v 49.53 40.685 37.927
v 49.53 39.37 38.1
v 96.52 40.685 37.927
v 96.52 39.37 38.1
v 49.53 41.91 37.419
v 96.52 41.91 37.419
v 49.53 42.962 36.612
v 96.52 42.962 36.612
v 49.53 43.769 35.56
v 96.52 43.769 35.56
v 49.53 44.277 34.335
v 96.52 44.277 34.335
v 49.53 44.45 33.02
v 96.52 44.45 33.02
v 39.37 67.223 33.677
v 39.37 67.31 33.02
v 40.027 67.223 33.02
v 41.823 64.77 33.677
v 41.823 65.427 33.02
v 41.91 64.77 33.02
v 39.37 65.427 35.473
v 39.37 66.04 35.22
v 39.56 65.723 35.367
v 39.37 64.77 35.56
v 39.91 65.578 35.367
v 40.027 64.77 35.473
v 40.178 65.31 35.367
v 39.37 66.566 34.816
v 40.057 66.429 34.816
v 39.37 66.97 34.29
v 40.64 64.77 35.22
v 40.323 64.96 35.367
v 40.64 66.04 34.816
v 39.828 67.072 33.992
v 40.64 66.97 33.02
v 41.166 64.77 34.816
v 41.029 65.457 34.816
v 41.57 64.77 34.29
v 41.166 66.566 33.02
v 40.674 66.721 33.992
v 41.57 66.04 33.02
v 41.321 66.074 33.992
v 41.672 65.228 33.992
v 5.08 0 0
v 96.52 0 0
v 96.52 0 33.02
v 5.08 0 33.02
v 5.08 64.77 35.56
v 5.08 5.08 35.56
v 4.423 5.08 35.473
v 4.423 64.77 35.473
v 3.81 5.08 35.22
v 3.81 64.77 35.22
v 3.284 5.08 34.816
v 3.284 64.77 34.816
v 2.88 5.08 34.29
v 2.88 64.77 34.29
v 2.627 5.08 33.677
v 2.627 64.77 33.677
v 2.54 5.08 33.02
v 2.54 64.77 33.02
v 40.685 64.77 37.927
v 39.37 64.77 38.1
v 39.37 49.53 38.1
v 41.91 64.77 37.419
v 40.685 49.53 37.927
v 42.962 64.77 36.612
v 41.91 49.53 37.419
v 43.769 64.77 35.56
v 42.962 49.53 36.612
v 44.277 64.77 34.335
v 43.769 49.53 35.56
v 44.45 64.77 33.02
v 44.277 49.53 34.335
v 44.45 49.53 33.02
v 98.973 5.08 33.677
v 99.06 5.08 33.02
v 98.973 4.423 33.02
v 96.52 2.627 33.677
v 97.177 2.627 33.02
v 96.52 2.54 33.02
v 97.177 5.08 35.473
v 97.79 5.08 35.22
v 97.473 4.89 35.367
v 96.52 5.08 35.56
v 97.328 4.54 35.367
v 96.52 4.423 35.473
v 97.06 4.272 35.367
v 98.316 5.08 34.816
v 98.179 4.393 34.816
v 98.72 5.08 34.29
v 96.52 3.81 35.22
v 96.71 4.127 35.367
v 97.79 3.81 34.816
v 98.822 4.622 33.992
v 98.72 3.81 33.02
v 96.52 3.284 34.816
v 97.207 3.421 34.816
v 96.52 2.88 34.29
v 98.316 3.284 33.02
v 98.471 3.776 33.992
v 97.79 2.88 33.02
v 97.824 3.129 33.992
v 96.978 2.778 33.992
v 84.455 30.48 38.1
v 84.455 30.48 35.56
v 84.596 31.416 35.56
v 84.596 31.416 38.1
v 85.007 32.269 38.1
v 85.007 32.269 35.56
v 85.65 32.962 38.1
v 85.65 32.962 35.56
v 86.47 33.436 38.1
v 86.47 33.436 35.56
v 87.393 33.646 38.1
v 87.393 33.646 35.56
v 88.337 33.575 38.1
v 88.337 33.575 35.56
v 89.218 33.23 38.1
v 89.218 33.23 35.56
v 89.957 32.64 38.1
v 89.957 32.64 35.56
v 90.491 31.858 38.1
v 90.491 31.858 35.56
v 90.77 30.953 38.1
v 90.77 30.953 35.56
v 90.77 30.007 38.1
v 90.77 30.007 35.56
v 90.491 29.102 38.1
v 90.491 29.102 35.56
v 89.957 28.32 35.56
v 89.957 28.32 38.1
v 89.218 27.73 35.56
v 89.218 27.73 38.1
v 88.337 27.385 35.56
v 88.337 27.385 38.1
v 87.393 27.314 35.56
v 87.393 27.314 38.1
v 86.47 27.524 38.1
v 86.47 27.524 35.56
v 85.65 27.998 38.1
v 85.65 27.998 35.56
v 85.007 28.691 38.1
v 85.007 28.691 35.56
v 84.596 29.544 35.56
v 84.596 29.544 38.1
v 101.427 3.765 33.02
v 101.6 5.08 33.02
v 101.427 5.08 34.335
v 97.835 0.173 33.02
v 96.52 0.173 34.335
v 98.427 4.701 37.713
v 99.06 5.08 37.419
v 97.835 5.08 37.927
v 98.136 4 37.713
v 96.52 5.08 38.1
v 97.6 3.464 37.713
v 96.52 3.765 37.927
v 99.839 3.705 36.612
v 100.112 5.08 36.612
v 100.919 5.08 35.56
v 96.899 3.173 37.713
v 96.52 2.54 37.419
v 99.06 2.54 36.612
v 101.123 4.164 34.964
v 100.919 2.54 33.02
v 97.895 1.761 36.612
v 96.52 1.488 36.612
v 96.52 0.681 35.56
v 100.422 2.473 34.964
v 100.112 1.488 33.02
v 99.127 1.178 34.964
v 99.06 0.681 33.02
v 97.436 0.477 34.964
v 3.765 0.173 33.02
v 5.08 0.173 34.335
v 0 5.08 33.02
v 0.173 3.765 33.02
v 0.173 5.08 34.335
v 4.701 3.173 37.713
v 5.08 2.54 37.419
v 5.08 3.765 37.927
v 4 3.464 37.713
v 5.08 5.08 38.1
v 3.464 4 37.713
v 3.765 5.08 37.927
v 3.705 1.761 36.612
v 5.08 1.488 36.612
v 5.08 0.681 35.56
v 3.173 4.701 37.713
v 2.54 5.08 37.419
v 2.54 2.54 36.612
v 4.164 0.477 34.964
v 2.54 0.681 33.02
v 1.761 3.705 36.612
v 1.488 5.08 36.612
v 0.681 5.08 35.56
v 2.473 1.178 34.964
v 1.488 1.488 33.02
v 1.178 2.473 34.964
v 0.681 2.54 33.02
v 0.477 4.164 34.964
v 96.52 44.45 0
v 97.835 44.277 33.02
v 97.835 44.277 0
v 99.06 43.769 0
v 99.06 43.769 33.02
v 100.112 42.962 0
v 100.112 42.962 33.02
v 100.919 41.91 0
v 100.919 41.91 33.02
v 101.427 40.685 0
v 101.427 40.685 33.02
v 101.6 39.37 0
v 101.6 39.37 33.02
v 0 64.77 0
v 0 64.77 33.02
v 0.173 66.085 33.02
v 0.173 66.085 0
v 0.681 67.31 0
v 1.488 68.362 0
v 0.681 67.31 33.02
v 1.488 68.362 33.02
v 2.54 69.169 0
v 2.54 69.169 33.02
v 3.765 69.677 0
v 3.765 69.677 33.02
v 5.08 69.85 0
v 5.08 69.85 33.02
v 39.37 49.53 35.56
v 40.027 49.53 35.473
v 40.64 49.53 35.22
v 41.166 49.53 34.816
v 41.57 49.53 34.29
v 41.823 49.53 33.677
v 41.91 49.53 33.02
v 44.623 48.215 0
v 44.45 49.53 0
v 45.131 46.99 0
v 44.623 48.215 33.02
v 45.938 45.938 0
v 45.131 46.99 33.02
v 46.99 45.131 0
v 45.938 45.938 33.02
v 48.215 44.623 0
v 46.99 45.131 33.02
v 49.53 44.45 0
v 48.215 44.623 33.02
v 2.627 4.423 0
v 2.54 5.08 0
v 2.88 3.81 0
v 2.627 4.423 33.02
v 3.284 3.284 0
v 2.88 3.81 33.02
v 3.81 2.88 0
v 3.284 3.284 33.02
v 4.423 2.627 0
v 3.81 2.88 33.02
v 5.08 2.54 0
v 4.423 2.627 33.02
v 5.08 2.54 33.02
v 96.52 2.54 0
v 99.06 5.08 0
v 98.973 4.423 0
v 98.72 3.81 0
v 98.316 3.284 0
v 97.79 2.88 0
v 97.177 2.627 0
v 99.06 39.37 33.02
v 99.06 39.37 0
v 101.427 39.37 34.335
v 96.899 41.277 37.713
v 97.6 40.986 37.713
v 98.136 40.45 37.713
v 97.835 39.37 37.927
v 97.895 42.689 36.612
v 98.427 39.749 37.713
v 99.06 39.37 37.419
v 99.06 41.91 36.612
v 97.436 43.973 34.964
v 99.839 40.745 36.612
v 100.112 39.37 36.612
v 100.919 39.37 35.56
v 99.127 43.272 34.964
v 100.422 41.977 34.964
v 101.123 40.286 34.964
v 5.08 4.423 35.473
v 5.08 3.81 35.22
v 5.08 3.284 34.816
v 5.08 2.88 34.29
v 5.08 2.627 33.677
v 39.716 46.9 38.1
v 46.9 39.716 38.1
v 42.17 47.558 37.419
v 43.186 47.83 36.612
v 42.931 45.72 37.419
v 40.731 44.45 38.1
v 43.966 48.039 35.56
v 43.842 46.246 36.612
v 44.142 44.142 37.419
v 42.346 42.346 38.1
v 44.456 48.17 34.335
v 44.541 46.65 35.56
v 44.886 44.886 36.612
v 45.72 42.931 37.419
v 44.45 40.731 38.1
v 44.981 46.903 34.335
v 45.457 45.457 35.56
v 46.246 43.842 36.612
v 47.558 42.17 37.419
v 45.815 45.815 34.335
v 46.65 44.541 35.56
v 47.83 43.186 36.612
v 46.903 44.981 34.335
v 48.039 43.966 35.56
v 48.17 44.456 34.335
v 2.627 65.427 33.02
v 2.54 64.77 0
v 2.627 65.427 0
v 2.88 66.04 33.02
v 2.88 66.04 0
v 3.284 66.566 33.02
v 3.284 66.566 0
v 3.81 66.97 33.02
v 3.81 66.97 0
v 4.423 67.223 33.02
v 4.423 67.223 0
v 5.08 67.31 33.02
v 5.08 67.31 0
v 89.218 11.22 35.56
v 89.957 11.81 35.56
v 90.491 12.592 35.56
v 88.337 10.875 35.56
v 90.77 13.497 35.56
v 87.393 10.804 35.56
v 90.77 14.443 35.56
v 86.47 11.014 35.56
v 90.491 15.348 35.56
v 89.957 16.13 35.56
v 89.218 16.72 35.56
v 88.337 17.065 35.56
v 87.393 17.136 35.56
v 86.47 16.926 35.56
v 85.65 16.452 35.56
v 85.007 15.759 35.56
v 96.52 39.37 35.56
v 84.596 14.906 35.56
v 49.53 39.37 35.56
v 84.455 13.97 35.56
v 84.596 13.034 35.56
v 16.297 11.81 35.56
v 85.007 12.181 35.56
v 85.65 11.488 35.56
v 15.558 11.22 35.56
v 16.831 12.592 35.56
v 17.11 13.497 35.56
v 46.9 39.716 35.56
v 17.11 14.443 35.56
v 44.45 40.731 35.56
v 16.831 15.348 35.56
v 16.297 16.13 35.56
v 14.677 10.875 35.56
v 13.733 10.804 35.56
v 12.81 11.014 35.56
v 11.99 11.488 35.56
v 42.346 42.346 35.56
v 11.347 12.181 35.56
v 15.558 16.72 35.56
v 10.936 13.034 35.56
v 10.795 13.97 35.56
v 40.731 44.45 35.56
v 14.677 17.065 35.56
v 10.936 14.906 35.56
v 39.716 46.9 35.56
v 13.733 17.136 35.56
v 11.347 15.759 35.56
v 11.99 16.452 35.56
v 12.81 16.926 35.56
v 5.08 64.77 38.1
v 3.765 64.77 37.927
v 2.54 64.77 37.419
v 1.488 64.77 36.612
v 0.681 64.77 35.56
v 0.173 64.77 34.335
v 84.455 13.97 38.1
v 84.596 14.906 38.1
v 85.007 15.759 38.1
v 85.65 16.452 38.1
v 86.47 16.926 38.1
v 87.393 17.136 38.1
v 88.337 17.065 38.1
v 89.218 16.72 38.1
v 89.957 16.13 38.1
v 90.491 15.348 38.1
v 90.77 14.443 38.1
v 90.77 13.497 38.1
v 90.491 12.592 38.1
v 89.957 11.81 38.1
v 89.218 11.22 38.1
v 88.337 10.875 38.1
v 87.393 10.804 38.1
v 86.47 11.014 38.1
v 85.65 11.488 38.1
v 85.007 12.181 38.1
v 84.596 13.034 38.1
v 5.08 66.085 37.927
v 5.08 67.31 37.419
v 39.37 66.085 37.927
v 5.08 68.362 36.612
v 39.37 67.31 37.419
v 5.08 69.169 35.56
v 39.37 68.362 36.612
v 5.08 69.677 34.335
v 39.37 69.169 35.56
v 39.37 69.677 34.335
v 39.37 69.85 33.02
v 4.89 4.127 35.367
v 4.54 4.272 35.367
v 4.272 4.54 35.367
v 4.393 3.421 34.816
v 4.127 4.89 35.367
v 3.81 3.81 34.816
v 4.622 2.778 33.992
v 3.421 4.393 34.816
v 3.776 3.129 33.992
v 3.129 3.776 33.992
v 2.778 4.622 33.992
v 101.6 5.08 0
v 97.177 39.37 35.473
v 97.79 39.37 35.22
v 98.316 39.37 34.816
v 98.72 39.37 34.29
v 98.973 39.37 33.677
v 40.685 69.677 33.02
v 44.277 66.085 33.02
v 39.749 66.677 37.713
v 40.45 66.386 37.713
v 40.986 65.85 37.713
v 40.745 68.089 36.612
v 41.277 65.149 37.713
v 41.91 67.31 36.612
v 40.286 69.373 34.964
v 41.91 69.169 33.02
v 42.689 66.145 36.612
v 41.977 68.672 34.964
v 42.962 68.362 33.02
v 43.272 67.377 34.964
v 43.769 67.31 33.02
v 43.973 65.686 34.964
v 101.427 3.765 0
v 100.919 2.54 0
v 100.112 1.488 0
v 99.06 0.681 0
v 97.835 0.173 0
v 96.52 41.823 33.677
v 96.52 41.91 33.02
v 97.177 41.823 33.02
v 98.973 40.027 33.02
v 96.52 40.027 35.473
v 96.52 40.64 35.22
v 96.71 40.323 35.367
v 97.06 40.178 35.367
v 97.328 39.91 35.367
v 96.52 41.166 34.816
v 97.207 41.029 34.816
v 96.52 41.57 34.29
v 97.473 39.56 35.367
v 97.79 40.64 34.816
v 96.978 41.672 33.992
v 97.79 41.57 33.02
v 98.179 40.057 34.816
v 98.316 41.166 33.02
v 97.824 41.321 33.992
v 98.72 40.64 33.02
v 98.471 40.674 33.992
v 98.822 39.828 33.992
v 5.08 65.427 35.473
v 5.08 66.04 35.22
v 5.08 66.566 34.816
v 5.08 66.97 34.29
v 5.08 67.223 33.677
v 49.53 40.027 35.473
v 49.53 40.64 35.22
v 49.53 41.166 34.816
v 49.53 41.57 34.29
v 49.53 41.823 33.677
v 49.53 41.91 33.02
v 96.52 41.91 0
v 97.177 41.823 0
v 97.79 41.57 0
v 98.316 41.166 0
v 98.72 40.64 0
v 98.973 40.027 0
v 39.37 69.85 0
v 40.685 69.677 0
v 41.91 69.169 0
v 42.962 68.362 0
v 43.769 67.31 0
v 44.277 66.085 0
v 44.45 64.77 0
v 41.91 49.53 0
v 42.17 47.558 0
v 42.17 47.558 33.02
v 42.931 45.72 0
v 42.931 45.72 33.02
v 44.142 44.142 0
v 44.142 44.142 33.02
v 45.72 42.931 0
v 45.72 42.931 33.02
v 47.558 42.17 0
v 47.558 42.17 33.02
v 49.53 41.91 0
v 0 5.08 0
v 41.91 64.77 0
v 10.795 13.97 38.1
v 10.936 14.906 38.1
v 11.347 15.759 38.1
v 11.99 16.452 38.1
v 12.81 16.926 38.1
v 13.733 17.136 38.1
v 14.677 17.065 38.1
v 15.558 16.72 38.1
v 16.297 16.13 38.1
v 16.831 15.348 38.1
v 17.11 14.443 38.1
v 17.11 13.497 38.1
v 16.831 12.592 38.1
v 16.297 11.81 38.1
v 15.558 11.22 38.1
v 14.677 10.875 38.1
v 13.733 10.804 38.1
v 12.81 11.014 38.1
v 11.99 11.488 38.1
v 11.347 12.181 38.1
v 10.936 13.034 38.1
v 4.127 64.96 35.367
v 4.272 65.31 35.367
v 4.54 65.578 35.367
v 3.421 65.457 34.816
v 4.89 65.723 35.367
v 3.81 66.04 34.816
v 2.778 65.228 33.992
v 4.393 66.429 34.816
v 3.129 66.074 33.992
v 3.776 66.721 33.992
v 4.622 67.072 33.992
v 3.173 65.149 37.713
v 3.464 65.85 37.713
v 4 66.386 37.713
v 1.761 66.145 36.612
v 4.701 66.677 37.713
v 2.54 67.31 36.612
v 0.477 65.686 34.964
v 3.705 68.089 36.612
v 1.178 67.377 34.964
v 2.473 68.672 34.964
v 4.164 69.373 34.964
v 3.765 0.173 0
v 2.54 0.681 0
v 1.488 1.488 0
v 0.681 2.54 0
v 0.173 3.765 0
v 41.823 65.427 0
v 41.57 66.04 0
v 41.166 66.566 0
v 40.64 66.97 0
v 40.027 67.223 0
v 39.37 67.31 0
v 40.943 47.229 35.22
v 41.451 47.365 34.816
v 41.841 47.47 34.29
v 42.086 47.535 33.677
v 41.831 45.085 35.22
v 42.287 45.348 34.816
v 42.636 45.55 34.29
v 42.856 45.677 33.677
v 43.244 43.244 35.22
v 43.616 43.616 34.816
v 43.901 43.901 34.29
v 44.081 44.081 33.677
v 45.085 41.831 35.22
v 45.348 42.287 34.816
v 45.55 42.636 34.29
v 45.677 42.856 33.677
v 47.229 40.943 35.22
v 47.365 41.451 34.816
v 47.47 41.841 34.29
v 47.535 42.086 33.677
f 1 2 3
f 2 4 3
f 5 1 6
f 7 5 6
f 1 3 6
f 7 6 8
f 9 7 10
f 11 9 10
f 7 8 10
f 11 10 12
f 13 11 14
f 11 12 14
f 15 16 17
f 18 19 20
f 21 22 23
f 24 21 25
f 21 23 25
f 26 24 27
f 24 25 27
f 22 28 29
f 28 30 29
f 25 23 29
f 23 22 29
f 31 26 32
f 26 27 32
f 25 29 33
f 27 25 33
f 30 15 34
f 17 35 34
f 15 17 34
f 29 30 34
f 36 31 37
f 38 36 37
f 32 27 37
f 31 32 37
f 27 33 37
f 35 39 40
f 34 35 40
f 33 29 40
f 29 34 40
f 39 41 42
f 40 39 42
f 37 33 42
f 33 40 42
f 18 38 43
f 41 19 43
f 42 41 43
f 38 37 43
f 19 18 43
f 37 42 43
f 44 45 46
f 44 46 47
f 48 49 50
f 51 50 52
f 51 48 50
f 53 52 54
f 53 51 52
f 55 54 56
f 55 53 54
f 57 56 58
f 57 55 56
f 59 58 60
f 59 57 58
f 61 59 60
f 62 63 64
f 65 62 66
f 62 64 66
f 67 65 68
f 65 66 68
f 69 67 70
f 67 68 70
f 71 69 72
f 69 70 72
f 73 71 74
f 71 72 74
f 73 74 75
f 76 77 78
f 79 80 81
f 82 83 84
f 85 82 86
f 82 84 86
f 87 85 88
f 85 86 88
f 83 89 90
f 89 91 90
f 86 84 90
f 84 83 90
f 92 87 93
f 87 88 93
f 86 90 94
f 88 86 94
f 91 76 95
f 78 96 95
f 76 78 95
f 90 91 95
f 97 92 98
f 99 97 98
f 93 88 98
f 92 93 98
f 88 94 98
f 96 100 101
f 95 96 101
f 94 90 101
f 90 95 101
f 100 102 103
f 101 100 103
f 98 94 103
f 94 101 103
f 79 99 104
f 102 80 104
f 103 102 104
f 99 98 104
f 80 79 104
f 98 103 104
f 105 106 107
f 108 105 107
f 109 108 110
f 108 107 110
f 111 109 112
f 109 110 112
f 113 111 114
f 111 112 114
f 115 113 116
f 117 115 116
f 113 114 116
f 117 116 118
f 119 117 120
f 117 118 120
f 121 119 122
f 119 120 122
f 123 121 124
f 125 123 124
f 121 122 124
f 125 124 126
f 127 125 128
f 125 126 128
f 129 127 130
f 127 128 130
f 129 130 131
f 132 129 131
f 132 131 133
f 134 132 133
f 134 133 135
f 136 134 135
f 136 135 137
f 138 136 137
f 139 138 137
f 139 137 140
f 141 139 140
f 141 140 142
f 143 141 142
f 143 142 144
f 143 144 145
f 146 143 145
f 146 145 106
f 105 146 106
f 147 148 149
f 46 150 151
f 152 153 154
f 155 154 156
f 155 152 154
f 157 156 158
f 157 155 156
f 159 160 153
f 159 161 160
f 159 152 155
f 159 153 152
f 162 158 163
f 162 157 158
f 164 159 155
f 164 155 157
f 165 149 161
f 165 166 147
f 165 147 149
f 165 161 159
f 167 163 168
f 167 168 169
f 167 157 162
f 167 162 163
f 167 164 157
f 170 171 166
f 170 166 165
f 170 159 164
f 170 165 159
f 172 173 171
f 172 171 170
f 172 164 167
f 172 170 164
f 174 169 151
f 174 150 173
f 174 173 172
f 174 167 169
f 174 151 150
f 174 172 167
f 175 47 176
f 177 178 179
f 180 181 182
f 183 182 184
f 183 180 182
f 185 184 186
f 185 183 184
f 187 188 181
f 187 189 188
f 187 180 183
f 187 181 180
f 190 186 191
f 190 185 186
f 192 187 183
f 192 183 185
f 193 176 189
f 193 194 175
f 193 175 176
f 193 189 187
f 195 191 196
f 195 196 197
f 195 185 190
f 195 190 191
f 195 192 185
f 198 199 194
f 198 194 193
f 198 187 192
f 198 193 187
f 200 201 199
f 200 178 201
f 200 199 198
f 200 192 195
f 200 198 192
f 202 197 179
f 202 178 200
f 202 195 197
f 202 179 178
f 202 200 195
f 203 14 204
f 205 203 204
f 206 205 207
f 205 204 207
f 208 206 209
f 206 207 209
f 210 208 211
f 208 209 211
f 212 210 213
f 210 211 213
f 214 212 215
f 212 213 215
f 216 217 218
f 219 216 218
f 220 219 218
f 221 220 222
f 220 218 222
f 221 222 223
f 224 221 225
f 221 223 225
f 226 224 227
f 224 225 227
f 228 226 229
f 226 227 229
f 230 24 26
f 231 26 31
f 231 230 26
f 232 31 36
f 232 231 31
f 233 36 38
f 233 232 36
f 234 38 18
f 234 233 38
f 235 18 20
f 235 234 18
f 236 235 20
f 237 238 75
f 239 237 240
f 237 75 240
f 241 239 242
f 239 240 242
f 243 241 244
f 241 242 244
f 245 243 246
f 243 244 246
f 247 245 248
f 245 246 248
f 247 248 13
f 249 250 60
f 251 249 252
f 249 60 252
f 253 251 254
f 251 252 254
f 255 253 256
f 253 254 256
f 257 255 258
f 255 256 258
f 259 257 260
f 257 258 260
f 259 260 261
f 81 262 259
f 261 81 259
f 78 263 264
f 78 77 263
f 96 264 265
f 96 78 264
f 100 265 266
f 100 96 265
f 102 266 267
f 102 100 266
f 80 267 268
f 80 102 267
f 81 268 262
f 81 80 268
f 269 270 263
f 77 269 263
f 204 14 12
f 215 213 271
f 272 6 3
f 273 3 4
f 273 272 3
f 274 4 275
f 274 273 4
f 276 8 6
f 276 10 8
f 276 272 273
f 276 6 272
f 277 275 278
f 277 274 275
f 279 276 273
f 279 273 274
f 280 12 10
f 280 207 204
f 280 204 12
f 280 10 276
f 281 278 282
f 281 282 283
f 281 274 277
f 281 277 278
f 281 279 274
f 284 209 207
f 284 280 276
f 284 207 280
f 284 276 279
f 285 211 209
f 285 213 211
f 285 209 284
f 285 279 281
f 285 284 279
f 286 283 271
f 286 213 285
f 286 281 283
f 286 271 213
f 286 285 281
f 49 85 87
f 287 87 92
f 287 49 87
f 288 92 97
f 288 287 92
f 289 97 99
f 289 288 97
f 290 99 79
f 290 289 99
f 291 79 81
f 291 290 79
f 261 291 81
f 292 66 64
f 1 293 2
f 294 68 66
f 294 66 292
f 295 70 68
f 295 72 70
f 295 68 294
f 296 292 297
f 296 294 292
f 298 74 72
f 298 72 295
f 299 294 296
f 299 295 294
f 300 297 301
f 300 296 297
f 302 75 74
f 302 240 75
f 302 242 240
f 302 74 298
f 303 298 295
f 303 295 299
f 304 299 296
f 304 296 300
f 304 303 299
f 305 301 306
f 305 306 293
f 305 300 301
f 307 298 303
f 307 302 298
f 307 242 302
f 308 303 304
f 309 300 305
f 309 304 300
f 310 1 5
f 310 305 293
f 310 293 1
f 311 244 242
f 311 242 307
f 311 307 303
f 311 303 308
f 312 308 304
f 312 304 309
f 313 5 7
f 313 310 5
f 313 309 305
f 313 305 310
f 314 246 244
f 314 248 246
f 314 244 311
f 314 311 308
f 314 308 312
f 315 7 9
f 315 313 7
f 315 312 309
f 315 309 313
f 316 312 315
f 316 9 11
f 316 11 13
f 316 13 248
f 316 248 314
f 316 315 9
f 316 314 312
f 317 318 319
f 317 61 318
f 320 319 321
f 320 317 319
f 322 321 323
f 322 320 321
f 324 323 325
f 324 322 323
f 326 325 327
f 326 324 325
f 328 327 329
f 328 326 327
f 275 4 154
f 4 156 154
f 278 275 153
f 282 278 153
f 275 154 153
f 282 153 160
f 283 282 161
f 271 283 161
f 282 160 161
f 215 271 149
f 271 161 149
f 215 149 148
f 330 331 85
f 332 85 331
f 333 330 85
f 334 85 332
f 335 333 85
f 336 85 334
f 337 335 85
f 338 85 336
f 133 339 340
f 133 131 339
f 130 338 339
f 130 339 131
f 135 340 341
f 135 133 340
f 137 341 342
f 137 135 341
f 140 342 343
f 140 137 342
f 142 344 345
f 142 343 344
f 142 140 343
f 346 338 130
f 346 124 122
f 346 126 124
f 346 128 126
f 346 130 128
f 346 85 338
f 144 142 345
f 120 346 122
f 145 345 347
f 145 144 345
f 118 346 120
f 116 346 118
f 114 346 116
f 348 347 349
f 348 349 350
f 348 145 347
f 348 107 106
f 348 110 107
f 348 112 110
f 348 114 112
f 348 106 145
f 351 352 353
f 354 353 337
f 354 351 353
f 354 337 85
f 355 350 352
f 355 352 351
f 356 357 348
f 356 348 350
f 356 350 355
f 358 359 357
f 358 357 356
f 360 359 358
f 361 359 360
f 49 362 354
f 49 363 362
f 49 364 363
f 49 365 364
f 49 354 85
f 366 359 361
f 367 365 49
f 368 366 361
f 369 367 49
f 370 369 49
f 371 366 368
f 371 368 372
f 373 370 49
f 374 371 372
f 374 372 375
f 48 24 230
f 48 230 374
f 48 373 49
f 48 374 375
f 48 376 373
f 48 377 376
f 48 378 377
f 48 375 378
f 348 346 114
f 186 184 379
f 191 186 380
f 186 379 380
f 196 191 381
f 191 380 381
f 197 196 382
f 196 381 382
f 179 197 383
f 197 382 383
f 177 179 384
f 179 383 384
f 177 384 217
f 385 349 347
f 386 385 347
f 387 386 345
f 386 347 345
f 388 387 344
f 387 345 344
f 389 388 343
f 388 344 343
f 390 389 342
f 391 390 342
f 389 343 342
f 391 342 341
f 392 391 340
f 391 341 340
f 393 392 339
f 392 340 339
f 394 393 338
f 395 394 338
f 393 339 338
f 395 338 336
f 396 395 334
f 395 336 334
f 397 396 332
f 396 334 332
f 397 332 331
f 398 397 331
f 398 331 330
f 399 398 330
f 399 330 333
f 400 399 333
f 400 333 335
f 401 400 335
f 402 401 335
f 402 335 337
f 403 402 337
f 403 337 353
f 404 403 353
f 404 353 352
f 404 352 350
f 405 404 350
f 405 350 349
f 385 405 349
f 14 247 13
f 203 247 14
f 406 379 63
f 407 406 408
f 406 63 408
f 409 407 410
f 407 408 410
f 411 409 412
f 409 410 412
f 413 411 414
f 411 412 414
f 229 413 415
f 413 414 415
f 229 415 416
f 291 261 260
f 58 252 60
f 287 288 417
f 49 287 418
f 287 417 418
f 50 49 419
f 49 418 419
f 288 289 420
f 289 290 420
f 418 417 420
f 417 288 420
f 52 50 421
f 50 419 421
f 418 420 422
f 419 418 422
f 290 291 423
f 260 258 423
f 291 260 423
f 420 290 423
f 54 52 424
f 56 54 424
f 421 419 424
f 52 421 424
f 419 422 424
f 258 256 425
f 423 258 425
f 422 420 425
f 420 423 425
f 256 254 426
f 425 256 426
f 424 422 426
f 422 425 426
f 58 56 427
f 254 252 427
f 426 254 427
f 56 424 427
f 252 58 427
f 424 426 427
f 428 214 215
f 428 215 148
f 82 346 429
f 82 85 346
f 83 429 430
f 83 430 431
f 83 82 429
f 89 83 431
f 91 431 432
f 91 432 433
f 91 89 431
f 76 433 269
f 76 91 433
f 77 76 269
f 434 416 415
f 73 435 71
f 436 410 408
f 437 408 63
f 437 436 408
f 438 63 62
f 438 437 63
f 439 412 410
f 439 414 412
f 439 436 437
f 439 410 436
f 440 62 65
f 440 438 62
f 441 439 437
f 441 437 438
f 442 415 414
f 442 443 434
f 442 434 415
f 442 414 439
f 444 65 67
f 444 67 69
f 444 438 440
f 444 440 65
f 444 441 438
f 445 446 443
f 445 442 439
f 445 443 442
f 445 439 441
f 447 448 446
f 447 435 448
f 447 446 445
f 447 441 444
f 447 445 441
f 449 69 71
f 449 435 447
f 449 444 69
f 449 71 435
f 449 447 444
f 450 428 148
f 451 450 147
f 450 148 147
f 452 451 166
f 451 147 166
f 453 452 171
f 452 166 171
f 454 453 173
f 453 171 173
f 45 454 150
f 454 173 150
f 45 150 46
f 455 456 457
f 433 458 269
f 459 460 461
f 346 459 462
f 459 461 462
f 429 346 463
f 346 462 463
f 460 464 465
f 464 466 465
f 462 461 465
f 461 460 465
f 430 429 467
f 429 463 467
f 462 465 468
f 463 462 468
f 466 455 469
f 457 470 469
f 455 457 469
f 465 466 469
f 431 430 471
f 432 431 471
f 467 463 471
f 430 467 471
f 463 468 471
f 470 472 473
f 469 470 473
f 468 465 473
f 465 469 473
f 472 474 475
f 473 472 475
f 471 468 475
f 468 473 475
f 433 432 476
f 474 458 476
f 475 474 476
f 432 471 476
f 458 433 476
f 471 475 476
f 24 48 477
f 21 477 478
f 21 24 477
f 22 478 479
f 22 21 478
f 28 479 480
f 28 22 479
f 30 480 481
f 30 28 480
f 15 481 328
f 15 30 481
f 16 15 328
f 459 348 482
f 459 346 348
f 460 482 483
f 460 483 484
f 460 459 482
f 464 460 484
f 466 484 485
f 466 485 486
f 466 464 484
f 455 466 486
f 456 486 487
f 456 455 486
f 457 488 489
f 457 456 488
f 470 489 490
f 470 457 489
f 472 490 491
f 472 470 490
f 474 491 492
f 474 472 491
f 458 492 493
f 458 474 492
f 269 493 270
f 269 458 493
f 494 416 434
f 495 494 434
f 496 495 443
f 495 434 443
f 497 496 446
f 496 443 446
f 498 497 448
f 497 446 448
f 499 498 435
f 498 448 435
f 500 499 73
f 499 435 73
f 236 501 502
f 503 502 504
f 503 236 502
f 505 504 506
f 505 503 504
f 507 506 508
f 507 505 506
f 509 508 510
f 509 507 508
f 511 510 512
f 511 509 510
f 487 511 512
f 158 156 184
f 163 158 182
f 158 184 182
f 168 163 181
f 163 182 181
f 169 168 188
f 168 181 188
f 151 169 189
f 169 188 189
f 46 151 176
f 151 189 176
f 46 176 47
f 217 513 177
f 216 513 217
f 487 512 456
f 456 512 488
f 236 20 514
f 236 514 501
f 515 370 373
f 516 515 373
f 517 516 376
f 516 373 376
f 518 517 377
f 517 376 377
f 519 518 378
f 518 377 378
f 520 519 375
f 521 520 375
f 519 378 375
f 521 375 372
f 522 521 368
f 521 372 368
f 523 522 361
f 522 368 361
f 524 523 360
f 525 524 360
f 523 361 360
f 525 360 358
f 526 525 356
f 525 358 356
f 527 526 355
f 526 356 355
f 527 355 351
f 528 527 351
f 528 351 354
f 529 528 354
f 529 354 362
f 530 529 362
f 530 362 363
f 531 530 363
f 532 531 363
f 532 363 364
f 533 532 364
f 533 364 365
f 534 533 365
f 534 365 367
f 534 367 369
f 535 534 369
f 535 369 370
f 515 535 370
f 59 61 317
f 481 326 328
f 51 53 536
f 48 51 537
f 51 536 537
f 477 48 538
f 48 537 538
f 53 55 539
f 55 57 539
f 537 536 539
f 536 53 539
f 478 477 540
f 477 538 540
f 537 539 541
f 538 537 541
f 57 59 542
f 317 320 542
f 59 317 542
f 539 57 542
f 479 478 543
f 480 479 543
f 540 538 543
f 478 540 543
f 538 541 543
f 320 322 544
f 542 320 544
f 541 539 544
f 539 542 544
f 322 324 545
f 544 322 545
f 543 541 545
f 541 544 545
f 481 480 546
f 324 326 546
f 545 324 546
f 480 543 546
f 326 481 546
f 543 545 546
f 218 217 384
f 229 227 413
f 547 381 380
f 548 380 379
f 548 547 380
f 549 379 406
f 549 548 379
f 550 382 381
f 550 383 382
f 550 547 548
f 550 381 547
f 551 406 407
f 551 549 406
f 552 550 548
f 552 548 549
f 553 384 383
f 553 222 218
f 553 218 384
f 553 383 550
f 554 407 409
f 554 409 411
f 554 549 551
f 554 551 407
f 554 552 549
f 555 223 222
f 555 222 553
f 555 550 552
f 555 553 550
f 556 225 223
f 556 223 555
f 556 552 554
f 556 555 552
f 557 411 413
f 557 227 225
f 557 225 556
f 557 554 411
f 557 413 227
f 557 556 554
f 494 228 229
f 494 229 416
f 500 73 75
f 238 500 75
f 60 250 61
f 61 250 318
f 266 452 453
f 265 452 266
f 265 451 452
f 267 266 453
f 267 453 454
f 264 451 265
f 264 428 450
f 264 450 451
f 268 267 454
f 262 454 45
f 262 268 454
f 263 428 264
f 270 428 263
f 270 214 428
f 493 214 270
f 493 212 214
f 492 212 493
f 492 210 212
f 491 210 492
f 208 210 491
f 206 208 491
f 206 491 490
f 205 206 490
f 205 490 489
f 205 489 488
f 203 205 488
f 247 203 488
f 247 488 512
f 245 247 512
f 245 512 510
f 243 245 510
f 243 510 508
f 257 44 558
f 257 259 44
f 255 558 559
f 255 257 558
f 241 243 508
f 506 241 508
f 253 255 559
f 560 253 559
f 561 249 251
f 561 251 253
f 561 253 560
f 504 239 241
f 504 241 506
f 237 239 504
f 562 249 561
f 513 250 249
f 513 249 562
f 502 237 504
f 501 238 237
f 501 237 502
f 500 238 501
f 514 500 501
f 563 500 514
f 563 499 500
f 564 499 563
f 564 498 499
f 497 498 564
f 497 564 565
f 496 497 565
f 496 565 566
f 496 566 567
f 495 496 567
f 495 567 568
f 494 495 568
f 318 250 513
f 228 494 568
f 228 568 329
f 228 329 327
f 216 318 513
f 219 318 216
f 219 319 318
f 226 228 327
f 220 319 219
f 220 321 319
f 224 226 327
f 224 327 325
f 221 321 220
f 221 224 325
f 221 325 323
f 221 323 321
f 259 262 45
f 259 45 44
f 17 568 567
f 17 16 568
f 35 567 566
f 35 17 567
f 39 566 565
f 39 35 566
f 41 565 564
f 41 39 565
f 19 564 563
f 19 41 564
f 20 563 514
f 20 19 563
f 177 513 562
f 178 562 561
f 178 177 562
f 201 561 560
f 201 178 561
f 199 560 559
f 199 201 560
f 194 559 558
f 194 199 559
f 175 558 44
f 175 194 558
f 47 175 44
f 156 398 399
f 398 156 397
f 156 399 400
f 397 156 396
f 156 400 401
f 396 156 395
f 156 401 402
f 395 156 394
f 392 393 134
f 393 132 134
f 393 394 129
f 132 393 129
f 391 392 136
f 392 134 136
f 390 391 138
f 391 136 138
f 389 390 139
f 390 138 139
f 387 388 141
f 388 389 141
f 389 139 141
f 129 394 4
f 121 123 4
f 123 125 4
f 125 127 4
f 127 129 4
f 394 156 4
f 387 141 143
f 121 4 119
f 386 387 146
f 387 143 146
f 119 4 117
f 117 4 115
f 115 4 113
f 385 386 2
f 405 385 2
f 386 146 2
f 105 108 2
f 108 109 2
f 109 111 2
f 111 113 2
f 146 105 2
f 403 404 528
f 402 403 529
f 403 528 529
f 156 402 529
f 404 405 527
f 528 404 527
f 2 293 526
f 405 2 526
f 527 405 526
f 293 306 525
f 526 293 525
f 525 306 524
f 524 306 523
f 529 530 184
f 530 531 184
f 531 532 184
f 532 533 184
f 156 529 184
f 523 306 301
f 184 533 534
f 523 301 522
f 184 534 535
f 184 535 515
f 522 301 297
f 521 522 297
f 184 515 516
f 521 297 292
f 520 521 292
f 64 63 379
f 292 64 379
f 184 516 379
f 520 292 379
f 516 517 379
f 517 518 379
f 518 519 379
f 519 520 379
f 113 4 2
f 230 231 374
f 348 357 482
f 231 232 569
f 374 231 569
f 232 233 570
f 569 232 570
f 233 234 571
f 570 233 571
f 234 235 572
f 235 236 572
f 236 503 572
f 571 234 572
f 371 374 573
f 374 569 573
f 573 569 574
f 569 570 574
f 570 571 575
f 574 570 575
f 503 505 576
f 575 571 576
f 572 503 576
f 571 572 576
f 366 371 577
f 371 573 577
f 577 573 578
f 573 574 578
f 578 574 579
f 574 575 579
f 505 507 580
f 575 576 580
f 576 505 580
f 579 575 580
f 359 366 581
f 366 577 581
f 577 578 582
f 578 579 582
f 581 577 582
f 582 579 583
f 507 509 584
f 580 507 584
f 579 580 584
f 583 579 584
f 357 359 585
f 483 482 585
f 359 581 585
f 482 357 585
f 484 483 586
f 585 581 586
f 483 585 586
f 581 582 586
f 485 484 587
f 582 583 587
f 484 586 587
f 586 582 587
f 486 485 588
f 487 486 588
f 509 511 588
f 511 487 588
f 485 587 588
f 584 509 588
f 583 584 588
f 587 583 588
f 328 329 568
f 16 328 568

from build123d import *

# Parameters (mm, degrees)
BOSS_EXTRUDE1_DEPTH          = 38.1
FILLET1_R                    = 5.08
FILLET2_R                    = 5.08
SHELL1_T                     = -2.54
F_97_0_0059_DIAMETER_HOLE1_D = 6.35
F_1_4_0_25_DIAMETER_HOLE1_D  = 6.35


with BuildPart() as part:
    # Sketch1 → Boss-Extrude1 (new body)
    with BuildSketch(Plane.XY):
        Polygon((0, 0), (0, 69.85), (44.45, 69.85), (44.45, 44.45), (101.6, 44.45), (101.6, 0), align=None)
    extrude(amount=BOSS_EXTRUDE1_DEPTH)

    # Fillet1
    fillet1_edges = [part.edges().sort_by_distance(p)[0] for p in [
        (0, 0, 19.05),
        (0, 69.85, 19.05),
        (44.45, 69.85, 19.05),
        (44.45, 44.45, 19.05),
        (101.6, 44.45, 19.05),
        (101.6, 0, 19.05),
    ]]
    fillet(fillet1_edges, radius=FILLET1_R)

    # Fillet2
    fillet2_edges = [part.edges().sort_by_distance(p)[0] for p in [
        (101.6, 22.225, 38.1),
        (50.8, 0, 38.1),
        (73.025, 44.45, 38.1),
        (44.45, 57.15, 38.1),
        (22.225, 69.85, 38.1),
        (0, 34.925, 38.1),
        (42.962102448, 68.362102448, 38.1),
        (1.487897552, 68.362102448, 38.1),
        (1.487897552, 1.487897552, 38.1),
        (100.112102448, 42.962102448, 38.1),
        (100.112102448, 1.487897552, 38.1),
        (45.937897552, 45.937897552, 38.1),
    ]]
    fillet(fillet2_edges, radius=FILLET2_R)

    # Shell1
    shell1_openings = [part.faces().sort_by_distance(p)[0] for p in [
        (48.683333333, 38.1, 0),
    ]]
    offset(amount=SHELL1_T, openings=shell1_openings, kind=Kind.INTERSECTION)

    # #97 (0.0059) Diameter Hole1 (through all)
    with Locations(Plane.XY.offset(38.1)):
        with Locations((87.63, 30.48)):
            Hole(F_97_0_0059_DIAMETER_HOLE1_D / 2)

    # 1/4 (0.25) Diameter Hole1 (through all)
    with Locations(Plane.XY.offset(38.1)):
        with Locations((87.63, 13.97), (13.97, 13.97)):
            Hole(F_1_4_0_25_DIAMETER_HOLE1_D / 2)


solid = part.part
